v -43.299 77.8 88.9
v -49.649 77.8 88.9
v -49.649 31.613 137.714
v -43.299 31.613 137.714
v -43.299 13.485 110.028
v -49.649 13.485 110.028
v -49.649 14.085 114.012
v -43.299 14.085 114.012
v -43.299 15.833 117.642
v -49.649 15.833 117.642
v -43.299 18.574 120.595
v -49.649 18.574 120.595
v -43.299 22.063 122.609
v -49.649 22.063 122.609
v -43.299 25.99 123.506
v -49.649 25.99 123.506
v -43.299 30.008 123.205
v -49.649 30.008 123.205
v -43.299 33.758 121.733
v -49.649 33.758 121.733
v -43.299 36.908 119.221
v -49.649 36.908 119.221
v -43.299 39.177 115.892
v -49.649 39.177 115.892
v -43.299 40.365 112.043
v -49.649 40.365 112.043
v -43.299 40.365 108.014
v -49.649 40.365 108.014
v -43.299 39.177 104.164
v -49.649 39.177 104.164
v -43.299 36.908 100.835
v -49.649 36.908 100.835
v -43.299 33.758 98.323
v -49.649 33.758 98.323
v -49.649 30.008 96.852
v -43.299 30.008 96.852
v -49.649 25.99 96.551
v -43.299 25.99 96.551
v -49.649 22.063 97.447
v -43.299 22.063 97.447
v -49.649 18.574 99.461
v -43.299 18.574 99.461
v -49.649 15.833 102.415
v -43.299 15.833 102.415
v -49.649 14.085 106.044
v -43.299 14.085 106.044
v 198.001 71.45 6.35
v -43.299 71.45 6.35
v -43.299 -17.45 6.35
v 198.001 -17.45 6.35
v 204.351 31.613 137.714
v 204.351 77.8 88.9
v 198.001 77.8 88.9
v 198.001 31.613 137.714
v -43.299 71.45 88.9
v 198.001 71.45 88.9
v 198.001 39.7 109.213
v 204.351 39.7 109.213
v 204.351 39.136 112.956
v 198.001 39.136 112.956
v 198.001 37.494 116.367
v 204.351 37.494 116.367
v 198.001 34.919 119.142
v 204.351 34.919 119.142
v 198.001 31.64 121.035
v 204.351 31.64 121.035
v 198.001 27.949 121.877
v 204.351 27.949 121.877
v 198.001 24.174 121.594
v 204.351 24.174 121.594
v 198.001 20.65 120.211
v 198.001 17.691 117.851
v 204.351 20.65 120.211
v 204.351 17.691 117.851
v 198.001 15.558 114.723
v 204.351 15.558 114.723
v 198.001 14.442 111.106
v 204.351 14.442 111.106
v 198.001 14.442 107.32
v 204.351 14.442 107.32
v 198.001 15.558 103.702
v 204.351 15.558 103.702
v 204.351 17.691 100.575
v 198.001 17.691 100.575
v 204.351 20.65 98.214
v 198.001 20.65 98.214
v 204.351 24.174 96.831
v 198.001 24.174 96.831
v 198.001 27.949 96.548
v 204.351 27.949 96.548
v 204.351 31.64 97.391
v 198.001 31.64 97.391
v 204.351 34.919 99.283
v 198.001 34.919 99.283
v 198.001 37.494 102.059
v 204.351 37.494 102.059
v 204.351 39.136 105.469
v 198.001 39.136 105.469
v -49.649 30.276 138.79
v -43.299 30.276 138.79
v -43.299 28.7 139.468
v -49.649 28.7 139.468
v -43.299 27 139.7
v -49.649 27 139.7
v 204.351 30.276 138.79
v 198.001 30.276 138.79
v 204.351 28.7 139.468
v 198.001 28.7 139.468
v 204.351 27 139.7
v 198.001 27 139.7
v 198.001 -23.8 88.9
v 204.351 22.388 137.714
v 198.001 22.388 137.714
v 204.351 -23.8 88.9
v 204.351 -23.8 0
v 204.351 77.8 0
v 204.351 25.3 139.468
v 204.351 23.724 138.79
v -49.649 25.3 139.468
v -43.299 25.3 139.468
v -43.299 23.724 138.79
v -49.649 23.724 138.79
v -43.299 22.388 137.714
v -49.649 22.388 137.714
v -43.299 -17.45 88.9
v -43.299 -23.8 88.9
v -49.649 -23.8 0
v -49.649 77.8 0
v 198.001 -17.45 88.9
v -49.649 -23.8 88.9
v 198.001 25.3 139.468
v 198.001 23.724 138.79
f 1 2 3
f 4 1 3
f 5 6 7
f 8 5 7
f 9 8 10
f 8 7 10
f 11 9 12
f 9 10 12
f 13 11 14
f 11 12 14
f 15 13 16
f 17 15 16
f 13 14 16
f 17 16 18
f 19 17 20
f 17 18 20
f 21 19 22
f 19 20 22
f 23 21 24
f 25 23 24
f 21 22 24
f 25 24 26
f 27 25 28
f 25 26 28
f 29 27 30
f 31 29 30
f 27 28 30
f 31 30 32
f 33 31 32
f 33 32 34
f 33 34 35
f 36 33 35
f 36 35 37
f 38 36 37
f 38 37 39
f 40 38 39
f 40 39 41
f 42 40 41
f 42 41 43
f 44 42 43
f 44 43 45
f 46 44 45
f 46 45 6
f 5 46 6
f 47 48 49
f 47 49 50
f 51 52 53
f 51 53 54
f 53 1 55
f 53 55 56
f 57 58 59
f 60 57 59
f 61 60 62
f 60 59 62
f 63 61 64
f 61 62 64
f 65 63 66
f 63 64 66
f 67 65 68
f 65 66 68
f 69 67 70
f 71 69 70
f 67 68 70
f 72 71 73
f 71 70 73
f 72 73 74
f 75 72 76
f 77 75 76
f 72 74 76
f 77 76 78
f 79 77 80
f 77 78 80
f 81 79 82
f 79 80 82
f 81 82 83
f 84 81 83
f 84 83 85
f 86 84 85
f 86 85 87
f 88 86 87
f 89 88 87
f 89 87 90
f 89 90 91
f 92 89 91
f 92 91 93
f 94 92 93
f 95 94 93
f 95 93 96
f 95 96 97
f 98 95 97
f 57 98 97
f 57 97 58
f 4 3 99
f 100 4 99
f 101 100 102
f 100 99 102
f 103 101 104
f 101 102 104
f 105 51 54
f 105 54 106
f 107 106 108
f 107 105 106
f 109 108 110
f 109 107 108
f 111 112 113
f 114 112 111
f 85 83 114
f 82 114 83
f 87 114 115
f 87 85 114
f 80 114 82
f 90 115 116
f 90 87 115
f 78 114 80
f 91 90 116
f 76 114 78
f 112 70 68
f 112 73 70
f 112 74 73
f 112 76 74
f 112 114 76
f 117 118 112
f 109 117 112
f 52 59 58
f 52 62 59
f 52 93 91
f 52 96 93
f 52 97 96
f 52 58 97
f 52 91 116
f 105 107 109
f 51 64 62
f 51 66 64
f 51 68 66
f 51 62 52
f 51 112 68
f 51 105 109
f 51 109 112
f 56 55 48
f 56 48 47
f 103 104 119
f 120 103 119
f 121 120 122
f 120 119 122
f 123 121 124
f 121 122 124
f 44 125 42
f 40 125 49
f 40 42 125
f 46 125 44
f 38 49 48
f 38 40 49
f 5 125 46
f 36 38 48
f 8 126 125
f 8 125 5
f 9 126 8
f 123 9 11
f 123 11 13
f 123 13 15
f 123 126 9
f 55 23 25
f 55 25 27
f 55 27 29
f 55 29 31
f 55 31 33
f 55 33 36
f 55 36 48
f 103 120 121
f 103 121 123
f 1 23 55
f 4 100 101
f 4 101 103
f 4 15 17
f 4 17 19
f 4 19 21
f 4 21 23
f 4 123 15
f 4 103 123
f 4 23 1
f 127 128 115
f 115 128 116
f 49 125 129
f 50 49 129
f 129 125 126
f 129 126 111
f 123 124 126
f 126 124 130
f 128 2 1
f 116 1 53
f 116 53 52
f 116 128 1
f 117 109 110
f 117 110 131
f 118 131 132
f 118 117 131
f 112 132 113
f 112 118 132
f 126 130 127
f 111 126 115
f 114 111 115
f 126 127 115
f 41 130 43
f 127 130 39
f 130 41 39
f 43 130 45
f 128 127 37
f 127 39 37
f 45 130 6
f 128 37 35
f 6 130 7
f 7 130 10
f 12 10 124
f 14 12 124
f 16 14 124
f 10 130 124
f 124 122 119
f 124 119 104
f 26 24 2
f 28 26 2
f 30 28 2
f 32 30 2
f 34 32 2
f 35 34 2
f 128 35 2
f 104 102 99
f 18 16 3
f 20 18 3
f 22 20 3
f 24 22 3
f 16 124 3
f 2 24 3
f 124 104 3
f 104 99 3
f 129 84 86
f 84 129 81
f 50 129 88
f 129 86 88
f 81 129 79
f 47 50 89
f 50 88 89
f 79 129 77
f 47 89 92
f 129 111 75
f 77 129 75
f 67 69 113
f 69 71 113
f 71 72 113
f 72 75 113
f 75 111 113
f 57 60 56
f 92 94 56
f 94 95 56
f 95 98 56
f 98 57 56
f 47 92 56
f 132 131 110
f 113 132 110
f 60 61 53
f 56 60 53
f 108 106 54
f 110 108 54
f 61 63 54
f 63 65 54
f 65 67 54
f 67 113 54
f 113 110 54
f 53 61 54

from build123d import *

# Parameters (mm, degrees)
F0_W      = 254
F0_H      = 101.6
F1_DEPTH  = 88.9
F4_DEPTH  = 6.35
F2_W      = 241.3
F2_H      = 88.9
F8_DEPTH  = 82.55
F9_R      = 12.7
F10_DEPTH = 25.4
F11_R     = 13.5154213428
F12_DEPTH = 25.4


with BuildPart() as f1:
    # F0 (on Top) → F1 (new body)
    with BuildSketch(Plane.XY):
        with Locations((77.3512227356, 27.0002914594)):
            Rectangle(F0_W, F0_H)
    extrude(amount=F1_DEPTH)

    # F3 (on face) → F4 (join)
    with BuildSketch(Plane.YZ.offset(204.3512227356)):
        with BuildLine():
            Line((22.3877730248, 137.7143067824), (-23.7997085406, 88.9))
            Line((-23.7997085406, 88.9), (27.0002914594, 88.9))
            Line((27.0002914594, 88.9), (27.0002914594, 139.7))
            ThreePointArc((27.0002914594, 139.7), (24.489399991, 139.1824886656), (22.3877730248, 137.7143067824))
        make_face()
        with BuildLine():
            Line((27.0002914594, 139.7), (27.0002914594, 88.9))
            Line((27.0002914594, 88.9), (77.8002914594, 88.9))
            Line((77.8002914594, 88.9), (31.6128098939, 137.7143067824))
            ThreePointArc((31.6128098939, 137.7143067824), (29.5111829277, 139.1824886656), (27.0002914594, 139.7))
        make_face()
    extrude(amount=-F4_DEPTH)

    # F7: F1 across plane


with BuildPart() as f1_1:
    add(f1.part)
    add(f1.part.mirror(Plane(origin=(77.3512227356, 27.0002914594, 88.9), x_dir=(0, 1, 0), z_dir=(1, 0, 0))))

    # F2 (on face) → F8 (cut)
    with BuildSketch(Plane.XY.offset(88.9)):
        with Locations((77.3512227356, 27.0002914594)):
            Rectangle(F2_W, F2_H)
    extrude(amount=-F8_DEPTH, mode=Mode.SUBTRACT)

    # F9 (on face) → F10 (cut)
    with BuildSketch(Plane.YZ.offset(204.3512227356)):
        with Locations((27.0002914594, 109.2127263546)):
            Circle(F9_R)
    extrude(amount=-F10_DEPTH, mode=Mode.SUBTRACT)

    # F11 (on face) → F12 (cut)
    with BuildSketch(Plane(origin=(-49.6487772644, 0, 0), x_dir=(0, -1, 0), z_dir=(-1, 0, 0))):
        with Locations((-27.0002914594, 110.0281476974)):
            Circle(F11_R)
    extrude(amount=-F12_DEPTH, mode=Mode.SUBTRACT)


solid = f1_1.part
